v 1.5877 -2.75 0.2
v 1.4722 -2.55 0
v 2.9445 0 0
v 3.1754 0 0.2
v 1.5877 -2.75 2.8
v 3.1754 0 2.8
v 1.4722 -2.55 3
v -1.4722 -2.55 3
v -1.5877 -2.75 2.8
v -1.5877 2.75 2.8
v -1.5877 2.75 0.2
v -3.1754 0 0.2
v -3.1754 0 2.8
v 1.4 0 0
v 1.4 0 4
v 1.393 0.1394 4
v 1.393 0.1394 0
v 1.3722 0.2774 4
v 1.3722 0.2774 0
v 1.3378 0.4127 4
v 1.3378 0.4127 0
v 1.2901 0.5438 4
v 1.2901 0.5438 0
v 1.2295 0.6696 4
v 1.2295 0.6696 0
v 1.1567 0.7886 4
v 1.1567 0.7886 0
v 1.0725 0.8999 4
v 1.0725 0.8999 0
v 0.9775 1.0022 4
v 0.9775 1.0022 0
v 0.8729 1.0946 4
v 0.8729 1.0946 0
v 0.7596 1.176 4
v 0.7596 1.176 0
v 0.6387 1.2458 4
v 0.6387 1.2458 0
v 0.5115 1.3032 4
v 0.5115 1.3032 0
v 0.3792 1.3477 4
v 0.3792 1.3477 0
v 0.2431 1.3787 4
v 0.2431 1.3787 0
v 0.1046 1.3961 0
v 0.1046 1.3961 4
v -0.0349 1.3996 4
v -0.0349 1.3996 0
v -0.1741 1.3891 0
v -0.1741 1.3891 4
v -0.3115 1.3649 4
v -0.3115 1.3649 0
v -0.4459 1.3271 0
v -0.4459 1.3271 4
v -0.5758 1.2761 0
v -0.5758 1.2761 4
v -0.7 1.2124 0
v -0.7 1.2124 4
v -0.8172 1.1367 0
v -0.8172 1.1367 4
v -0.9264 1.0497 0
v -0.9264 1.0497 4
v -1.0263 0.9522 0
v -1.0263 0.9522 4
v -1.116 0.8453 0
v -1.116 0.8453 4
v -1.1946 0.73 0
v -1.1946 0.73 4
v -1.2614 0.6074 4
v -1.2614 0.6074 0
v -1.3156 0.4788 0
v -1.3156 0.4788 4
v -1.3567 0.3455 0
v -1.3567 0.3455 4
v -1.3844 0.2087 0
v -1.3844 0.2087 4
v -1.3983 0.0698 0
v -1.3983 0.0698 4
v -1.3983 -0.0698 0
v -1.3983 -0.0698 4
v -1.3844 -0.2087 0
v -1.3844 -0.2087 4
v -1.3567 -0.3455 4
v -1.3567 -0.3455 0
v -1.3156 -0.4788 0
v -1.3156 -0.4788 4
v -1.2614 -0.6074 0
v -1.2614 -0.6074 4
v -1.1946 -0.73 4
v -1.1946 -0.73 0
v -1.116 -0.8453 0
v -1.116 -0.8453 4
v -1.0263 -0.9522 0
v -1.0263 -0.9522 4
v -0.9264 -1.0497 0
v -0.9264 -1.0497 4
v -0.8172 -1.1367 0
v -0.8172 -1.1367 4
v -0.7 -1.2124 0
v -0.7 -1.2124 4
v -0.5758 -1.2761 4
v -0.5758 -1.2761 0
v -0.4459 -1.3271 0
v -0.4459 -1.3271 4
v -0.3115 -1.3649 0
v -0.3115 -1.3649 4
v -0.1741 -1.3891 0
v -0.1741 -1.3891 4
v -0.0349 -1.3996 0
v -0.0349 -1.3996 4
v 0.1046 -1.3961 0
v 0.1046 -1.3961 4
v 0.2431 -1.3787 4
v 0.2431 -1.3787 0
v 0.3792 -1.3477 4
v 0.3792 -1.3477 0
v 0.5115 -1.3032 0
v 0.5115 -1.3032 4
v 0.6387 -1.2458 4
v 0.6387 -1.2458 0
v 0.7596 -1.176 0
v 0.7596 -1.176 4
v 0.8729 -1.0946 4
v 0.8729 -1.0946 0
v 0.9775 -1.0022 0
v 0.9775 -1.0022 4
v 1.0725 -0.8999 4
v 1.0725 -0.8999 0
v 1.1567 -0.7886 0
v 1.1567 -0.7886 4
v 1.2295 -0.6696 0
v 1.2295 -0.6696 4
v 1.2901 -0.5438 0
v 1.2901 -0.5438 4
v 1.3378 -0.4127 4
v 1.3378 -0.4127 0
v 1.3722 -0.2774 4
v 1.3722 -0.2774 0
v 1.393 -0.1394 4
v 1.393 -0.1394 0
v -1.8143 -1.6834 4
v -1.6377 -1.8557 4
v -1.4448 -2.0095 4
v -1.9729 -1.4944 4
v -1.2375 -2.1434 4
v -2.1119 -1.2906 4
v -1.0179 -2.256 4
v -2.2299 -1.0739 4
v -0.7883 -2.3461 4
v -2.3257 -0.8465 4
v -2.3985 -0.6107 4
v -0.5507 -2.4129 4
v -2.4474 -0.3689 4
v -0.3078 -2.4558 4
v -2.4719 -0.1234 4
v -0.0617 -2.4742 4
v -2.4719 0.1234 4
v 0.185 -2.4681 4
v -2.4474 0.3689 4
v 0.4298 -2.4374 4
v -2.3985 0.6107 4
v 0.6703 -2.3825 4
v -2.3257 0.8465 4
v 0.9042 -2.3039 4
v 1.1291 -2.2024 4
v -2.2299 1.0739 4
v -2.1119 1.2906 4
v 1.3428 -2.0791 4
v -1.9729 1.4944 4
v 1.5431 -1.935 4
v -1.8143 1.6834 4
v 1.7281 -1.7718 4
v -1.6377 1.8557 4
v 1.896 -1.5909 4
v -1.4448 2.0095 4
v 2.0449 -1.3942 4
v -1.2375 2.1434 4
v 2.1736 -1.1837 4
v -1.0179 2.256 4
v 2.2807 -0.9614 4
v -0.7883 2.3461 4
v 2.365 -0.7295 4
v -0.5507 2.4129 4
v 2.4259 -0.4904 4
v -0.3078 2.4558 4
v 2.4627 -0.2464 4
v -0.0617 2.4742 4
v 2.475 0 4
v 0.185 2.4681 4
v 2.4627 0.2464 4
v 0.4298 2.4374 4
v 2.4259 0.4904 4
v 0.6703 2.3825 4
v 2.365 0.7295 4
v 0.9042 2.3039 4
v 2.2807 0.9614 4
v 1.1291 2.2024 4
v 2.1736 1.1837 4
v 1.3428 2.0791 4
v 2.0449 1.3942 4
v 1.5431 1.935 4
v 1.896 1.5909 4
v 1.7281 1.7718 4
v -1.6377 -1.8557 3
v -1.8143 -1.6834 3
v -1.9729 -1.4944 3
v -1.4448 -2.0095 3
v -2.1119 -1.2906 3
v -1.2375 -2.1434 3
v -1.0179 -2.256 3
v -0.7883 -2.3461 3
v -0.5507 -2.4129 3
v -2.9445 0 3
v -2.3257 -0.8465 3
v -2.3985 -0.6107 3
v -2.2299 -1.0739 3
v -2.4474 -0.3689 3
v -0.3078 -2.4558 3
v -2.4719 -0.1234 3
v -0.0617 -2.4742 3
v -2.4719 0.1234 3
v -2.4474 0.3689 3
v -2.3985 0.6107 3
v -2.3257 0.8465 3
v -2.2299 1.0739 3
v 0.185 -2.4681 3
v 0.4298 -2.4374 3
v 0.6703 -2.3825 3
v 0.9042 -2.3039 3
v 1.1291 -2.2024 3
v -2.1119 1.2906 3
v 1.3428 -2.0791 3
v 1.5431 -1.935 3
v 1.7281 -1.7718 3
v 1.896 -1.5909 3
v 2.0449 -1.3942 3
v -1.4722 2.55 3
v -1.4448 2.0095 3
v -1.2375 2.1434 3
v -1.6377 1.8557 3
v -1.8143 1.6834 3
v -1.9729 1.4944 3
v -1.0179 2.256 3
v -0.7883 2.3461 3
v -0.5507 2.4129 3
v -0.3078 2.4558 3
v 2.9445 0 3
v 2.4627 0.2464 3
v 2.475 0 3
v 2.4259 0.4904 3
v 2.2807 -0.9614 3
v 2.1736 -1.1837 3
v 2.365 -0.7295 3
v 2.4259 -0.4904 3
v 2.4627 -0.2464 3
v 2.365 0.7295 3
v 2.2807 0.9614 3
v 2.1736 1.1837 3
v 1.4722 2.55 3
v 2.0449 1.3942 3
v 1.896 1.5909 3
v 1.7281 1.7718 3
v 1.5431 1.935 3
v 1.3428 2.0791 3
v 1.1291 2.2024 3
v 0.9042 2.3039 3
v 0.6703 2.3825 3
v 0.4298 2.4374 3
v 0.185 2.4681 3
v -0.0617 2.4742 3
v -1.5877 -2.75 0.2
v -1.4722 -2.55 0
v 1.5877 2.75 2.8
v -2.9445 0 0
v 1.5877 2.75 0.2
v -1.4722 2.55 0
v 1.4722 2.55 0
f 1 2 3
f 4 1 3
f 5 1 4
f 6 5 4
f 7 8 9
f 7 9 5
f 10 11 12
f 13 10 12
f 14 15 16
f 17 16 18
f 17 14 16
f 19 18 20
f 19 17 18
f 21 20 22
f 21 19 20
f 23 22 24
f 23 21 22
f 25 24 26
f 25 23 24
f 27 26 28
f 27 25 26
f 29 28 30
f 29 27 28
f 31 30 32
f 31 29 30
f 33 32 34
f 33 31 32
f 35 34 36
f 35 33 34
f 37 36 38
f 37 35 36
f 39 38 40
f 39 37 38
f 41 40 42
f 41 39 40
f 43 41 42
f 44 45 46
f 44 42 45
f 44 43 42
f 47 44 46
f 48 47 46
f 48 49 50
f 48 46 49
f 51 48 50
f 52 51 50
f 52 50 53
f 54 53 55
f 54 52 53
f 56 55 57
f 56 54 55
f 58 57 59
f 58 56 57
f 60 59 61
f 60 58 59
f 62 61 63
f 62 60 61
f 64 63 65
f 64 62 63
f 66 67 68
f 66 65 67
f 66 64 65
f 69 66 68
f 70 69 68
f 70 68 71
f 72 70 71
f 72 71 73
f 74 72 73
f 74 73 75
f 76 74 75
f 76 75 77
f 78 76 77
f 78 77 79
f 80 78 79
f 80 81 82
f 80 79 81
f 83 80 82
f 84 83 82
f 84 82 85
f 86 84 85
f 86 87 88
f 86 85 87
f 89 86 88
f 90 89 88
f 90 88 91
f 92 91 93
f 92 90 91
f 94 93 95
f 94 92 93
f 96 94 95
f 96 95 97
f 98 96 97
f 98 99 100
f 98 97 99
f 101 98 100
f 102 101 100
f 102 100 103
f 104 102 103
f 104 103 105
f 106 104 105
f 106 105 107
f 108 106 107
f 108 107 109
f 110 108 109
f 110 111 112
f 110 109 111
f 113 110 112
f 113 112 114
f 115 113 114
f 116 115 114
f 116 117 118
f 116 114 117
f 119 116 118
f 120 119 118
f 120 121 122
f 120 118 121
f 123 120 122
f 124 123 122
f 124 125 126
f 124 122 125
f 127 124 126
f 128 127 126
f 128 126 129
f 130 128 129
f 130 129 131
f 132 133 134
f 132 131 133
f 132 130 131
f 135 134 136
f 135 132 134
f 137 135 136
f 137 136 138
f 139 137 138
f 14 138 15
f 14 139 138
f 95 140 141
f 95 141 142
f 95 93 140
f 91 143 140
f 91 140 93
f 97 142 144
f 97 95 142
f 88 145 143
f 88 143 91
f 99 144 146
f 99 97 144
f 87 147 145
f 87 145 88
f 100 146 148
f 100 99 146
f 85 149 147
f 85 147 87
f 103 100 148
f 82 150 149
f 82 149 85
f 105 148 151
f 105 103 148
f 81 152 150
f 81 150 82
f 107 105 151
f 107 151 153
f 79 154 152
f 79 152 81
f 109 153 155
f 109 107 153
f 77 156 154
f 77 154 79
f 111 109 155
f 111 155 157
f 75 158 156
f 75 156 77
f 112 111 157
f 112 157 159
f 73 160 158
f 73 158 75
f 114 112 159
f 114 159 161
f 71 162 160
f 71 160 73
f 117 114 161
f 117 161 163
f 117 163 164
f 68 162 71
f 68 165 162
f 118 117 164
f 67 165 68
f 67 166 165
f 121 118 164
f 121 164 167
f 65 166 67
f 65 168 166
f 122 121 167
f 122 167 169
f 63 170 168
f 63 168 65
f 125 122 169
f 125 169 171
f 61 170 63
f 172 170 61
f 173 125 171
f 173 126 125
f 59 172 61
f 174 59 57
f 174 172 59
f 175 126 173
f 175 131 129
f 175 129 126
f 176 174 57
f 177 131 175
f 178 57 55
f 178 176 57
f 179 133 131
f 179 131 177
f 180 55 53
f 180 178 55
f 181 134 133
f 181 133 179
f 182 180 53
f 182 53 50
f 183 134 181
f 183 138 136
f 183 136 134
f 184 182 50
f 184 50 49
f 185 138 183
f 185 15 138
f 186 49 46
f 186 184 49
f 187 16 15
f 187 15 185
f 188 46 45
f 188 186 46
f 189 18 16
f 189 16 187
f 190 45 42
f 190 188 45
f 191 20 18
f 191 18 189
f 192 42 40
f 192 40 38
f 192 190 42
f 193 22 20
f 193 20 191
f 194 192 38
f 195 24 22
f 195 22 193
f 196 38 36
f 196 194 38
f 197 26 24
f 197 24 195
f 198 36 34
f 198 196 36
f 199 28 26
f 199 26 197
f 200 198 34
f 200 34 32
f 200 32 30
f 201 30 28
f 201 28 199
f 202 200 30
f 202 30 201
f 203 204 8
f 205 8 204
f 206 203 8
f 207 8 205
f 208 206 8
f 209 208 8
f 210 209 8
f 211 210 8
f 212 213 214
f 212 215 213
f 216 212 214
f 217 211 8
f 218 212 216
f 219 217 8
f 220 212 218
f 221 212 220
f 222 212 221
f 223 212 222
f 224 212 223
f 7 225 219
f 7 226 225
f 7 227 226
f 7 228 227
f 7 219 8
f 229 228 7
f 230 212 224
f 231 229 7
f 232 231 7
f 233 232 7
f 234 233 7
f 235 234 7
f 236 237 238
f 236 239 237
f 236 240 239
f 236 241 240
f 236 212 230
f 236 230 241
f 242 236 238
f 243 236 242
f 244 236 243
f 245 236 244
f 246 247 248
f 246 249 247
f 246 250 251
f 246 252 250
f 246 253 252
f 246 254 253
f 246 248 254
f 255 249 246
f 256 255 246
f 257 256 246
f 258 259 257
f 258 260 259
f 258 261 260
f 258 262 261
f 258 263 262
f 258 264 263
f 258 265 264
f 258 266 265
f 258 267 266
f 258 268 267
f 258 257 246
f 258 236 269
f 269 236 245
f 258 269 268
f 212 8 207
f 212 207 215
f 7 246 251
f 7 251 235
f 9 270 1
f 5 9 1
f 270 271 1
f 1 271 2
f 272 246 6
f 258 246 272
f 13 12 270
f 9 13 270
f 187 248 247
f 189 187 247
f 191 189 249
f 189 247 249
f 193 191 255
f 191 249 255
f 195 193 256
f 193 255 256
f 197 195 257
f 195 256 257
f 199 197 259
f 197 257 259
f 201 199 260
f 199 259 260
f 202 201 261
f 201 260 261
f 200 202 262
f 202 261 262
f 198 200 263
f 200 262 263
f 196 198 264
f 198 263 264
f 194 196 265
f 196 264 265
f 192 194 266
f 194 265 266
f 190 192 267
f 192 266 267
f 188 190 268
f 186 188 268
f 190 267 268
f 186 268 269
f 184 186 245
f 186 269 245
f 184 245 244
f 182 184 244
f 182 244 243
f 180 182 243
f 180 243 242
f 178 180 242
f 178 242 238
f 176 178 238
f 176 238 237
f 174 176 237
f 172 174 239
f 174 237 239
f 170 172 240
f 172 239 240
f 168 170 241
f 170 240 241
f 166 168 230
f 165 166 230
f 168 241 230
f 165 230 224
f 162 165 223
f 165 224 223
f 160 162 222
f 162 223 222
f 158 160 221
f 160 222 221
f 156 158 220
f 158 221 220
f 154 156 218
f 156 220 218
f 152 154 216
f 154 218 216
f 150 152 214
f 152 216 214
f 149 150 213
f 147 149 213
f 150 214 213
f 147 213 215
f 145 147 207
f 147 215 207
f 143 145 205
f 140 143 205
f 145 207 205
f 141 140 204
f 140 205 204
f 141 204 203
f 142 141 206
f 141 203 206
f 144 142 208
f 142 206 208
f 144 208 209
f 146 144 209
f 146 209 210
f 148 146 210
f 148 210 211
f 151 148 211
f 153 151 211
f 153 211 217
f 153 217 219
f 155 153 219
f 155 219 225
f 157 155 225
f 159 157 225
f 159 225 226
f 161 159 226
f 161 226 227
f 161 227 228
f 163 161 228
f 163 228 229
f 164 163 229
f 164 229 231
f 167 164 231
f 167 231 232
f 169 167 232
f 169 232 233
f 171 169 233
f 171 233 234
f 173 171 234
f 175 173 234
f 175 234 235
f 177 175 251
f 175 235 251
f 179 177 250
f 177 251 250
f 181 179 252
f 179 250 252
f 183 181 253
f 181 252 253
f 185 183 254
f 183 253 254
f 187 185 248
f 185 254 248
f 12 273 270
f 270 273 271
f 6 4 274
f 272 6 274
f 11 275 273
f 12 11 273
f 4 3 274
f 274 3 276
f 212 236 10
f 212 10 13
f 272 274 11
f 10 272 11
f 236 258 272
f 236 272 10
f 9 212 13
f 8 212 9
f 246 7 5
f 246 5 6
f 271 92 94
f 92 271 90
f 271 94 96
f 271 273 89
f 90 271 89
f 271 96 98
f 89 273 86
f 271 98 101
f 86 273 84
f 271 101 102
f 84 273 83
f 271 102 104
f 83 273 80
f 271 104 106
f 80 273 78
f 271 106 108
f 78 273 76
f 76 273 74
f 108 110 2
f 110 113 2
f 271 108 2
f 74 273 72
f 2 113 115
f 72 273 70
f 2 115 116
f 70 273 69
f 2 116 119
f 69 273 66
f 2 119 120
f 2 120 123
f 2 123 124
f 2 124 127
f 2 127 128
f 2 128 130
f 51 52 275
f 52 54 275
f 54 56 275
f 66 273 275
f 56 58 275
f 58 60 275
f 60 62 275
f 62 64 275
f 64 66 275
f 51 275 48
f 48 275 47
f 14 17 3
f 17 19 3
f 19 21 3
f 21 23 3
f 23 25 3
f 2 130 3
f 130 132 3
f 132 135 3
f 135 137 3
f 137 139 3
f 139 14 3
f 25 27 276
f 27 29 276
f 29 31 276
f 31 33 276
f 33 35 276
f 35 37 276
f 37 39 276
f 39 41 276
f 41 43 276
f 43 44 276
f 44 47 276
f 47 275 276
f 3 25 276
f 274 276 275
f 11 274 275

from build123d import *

# Parameters (mm, degrees)
NUT_HEX_EXTRUDE_DEPTH  = 3
HEX_EDGE_CHAMFERS_SIZE = 0.2
NYLON_COLLAR_SKETCH_R  = 2.475
NYLON_COLLAR_DEPTH     = 1
THREAD_BORE_SKETCH_R   = 1.4
THREAD_BORE_CUT_DEPTH  = 6.800502852


with BuildPart() as part:
    # Nut Hex Sketch → Nut Hex Extrude (new body)
    with BuildSketch(Plane.XY):
        Polygon((3.175426481, 0), (1.58771324, 2.75), (-1.58771324, 2.75), (-3.175426481, 0), (-1.58771324, -2.75), (1.58771324, -2.75), align=None)
    extrude(amount=NUT_HEX_EXTRUDE_DEPTH)

    # Hex Edge Chamfers
    hex_edge_chamfers_edges = [part.edges().sort_by_distance(p)[0] for p in [
        (0, 2.75, 3),
        (-2.38156986, 1.375, 3),
        (-2.38156986, -1.375, 3),
        (0, -2.75, 3),
        (2.38156986, -1.375, 3),
        (0, -2.75, 0),
        (-2.38156986, -1.375, 0),
        (-2.38156986, 1.375, 0),
        (0, 2.75, 0),
        (2.38156986, 1.375, 0),
        (2.38156986, -1.375, 0),
        (2.38156986, 1.375, 3),
    ]]
    chamfer(hex_edge_chamfers_edges, length=HEX_EDGE_CHAMFERS_SIZE)

    # Nylon Collar Sketch → Nylon Collar (add)
    with BuildSketch(Plane.XY.offset(3)):
        Circle(NYLON_COLLAR_SKETCH_R)
    extrude(amount=NYLON_COLLAR_DEPTH)

    # Thread Bore Sketch → Thread Bore Cut (cut, through all)
    with BuildSketch(Plane.XY):
        Circle(THREAD_BORE_SKETCH_R)
    extrude(amount=THREAD_BORE_CUT_DEPTH, mode=Mode.SUBTRACT)


solid = part.part
